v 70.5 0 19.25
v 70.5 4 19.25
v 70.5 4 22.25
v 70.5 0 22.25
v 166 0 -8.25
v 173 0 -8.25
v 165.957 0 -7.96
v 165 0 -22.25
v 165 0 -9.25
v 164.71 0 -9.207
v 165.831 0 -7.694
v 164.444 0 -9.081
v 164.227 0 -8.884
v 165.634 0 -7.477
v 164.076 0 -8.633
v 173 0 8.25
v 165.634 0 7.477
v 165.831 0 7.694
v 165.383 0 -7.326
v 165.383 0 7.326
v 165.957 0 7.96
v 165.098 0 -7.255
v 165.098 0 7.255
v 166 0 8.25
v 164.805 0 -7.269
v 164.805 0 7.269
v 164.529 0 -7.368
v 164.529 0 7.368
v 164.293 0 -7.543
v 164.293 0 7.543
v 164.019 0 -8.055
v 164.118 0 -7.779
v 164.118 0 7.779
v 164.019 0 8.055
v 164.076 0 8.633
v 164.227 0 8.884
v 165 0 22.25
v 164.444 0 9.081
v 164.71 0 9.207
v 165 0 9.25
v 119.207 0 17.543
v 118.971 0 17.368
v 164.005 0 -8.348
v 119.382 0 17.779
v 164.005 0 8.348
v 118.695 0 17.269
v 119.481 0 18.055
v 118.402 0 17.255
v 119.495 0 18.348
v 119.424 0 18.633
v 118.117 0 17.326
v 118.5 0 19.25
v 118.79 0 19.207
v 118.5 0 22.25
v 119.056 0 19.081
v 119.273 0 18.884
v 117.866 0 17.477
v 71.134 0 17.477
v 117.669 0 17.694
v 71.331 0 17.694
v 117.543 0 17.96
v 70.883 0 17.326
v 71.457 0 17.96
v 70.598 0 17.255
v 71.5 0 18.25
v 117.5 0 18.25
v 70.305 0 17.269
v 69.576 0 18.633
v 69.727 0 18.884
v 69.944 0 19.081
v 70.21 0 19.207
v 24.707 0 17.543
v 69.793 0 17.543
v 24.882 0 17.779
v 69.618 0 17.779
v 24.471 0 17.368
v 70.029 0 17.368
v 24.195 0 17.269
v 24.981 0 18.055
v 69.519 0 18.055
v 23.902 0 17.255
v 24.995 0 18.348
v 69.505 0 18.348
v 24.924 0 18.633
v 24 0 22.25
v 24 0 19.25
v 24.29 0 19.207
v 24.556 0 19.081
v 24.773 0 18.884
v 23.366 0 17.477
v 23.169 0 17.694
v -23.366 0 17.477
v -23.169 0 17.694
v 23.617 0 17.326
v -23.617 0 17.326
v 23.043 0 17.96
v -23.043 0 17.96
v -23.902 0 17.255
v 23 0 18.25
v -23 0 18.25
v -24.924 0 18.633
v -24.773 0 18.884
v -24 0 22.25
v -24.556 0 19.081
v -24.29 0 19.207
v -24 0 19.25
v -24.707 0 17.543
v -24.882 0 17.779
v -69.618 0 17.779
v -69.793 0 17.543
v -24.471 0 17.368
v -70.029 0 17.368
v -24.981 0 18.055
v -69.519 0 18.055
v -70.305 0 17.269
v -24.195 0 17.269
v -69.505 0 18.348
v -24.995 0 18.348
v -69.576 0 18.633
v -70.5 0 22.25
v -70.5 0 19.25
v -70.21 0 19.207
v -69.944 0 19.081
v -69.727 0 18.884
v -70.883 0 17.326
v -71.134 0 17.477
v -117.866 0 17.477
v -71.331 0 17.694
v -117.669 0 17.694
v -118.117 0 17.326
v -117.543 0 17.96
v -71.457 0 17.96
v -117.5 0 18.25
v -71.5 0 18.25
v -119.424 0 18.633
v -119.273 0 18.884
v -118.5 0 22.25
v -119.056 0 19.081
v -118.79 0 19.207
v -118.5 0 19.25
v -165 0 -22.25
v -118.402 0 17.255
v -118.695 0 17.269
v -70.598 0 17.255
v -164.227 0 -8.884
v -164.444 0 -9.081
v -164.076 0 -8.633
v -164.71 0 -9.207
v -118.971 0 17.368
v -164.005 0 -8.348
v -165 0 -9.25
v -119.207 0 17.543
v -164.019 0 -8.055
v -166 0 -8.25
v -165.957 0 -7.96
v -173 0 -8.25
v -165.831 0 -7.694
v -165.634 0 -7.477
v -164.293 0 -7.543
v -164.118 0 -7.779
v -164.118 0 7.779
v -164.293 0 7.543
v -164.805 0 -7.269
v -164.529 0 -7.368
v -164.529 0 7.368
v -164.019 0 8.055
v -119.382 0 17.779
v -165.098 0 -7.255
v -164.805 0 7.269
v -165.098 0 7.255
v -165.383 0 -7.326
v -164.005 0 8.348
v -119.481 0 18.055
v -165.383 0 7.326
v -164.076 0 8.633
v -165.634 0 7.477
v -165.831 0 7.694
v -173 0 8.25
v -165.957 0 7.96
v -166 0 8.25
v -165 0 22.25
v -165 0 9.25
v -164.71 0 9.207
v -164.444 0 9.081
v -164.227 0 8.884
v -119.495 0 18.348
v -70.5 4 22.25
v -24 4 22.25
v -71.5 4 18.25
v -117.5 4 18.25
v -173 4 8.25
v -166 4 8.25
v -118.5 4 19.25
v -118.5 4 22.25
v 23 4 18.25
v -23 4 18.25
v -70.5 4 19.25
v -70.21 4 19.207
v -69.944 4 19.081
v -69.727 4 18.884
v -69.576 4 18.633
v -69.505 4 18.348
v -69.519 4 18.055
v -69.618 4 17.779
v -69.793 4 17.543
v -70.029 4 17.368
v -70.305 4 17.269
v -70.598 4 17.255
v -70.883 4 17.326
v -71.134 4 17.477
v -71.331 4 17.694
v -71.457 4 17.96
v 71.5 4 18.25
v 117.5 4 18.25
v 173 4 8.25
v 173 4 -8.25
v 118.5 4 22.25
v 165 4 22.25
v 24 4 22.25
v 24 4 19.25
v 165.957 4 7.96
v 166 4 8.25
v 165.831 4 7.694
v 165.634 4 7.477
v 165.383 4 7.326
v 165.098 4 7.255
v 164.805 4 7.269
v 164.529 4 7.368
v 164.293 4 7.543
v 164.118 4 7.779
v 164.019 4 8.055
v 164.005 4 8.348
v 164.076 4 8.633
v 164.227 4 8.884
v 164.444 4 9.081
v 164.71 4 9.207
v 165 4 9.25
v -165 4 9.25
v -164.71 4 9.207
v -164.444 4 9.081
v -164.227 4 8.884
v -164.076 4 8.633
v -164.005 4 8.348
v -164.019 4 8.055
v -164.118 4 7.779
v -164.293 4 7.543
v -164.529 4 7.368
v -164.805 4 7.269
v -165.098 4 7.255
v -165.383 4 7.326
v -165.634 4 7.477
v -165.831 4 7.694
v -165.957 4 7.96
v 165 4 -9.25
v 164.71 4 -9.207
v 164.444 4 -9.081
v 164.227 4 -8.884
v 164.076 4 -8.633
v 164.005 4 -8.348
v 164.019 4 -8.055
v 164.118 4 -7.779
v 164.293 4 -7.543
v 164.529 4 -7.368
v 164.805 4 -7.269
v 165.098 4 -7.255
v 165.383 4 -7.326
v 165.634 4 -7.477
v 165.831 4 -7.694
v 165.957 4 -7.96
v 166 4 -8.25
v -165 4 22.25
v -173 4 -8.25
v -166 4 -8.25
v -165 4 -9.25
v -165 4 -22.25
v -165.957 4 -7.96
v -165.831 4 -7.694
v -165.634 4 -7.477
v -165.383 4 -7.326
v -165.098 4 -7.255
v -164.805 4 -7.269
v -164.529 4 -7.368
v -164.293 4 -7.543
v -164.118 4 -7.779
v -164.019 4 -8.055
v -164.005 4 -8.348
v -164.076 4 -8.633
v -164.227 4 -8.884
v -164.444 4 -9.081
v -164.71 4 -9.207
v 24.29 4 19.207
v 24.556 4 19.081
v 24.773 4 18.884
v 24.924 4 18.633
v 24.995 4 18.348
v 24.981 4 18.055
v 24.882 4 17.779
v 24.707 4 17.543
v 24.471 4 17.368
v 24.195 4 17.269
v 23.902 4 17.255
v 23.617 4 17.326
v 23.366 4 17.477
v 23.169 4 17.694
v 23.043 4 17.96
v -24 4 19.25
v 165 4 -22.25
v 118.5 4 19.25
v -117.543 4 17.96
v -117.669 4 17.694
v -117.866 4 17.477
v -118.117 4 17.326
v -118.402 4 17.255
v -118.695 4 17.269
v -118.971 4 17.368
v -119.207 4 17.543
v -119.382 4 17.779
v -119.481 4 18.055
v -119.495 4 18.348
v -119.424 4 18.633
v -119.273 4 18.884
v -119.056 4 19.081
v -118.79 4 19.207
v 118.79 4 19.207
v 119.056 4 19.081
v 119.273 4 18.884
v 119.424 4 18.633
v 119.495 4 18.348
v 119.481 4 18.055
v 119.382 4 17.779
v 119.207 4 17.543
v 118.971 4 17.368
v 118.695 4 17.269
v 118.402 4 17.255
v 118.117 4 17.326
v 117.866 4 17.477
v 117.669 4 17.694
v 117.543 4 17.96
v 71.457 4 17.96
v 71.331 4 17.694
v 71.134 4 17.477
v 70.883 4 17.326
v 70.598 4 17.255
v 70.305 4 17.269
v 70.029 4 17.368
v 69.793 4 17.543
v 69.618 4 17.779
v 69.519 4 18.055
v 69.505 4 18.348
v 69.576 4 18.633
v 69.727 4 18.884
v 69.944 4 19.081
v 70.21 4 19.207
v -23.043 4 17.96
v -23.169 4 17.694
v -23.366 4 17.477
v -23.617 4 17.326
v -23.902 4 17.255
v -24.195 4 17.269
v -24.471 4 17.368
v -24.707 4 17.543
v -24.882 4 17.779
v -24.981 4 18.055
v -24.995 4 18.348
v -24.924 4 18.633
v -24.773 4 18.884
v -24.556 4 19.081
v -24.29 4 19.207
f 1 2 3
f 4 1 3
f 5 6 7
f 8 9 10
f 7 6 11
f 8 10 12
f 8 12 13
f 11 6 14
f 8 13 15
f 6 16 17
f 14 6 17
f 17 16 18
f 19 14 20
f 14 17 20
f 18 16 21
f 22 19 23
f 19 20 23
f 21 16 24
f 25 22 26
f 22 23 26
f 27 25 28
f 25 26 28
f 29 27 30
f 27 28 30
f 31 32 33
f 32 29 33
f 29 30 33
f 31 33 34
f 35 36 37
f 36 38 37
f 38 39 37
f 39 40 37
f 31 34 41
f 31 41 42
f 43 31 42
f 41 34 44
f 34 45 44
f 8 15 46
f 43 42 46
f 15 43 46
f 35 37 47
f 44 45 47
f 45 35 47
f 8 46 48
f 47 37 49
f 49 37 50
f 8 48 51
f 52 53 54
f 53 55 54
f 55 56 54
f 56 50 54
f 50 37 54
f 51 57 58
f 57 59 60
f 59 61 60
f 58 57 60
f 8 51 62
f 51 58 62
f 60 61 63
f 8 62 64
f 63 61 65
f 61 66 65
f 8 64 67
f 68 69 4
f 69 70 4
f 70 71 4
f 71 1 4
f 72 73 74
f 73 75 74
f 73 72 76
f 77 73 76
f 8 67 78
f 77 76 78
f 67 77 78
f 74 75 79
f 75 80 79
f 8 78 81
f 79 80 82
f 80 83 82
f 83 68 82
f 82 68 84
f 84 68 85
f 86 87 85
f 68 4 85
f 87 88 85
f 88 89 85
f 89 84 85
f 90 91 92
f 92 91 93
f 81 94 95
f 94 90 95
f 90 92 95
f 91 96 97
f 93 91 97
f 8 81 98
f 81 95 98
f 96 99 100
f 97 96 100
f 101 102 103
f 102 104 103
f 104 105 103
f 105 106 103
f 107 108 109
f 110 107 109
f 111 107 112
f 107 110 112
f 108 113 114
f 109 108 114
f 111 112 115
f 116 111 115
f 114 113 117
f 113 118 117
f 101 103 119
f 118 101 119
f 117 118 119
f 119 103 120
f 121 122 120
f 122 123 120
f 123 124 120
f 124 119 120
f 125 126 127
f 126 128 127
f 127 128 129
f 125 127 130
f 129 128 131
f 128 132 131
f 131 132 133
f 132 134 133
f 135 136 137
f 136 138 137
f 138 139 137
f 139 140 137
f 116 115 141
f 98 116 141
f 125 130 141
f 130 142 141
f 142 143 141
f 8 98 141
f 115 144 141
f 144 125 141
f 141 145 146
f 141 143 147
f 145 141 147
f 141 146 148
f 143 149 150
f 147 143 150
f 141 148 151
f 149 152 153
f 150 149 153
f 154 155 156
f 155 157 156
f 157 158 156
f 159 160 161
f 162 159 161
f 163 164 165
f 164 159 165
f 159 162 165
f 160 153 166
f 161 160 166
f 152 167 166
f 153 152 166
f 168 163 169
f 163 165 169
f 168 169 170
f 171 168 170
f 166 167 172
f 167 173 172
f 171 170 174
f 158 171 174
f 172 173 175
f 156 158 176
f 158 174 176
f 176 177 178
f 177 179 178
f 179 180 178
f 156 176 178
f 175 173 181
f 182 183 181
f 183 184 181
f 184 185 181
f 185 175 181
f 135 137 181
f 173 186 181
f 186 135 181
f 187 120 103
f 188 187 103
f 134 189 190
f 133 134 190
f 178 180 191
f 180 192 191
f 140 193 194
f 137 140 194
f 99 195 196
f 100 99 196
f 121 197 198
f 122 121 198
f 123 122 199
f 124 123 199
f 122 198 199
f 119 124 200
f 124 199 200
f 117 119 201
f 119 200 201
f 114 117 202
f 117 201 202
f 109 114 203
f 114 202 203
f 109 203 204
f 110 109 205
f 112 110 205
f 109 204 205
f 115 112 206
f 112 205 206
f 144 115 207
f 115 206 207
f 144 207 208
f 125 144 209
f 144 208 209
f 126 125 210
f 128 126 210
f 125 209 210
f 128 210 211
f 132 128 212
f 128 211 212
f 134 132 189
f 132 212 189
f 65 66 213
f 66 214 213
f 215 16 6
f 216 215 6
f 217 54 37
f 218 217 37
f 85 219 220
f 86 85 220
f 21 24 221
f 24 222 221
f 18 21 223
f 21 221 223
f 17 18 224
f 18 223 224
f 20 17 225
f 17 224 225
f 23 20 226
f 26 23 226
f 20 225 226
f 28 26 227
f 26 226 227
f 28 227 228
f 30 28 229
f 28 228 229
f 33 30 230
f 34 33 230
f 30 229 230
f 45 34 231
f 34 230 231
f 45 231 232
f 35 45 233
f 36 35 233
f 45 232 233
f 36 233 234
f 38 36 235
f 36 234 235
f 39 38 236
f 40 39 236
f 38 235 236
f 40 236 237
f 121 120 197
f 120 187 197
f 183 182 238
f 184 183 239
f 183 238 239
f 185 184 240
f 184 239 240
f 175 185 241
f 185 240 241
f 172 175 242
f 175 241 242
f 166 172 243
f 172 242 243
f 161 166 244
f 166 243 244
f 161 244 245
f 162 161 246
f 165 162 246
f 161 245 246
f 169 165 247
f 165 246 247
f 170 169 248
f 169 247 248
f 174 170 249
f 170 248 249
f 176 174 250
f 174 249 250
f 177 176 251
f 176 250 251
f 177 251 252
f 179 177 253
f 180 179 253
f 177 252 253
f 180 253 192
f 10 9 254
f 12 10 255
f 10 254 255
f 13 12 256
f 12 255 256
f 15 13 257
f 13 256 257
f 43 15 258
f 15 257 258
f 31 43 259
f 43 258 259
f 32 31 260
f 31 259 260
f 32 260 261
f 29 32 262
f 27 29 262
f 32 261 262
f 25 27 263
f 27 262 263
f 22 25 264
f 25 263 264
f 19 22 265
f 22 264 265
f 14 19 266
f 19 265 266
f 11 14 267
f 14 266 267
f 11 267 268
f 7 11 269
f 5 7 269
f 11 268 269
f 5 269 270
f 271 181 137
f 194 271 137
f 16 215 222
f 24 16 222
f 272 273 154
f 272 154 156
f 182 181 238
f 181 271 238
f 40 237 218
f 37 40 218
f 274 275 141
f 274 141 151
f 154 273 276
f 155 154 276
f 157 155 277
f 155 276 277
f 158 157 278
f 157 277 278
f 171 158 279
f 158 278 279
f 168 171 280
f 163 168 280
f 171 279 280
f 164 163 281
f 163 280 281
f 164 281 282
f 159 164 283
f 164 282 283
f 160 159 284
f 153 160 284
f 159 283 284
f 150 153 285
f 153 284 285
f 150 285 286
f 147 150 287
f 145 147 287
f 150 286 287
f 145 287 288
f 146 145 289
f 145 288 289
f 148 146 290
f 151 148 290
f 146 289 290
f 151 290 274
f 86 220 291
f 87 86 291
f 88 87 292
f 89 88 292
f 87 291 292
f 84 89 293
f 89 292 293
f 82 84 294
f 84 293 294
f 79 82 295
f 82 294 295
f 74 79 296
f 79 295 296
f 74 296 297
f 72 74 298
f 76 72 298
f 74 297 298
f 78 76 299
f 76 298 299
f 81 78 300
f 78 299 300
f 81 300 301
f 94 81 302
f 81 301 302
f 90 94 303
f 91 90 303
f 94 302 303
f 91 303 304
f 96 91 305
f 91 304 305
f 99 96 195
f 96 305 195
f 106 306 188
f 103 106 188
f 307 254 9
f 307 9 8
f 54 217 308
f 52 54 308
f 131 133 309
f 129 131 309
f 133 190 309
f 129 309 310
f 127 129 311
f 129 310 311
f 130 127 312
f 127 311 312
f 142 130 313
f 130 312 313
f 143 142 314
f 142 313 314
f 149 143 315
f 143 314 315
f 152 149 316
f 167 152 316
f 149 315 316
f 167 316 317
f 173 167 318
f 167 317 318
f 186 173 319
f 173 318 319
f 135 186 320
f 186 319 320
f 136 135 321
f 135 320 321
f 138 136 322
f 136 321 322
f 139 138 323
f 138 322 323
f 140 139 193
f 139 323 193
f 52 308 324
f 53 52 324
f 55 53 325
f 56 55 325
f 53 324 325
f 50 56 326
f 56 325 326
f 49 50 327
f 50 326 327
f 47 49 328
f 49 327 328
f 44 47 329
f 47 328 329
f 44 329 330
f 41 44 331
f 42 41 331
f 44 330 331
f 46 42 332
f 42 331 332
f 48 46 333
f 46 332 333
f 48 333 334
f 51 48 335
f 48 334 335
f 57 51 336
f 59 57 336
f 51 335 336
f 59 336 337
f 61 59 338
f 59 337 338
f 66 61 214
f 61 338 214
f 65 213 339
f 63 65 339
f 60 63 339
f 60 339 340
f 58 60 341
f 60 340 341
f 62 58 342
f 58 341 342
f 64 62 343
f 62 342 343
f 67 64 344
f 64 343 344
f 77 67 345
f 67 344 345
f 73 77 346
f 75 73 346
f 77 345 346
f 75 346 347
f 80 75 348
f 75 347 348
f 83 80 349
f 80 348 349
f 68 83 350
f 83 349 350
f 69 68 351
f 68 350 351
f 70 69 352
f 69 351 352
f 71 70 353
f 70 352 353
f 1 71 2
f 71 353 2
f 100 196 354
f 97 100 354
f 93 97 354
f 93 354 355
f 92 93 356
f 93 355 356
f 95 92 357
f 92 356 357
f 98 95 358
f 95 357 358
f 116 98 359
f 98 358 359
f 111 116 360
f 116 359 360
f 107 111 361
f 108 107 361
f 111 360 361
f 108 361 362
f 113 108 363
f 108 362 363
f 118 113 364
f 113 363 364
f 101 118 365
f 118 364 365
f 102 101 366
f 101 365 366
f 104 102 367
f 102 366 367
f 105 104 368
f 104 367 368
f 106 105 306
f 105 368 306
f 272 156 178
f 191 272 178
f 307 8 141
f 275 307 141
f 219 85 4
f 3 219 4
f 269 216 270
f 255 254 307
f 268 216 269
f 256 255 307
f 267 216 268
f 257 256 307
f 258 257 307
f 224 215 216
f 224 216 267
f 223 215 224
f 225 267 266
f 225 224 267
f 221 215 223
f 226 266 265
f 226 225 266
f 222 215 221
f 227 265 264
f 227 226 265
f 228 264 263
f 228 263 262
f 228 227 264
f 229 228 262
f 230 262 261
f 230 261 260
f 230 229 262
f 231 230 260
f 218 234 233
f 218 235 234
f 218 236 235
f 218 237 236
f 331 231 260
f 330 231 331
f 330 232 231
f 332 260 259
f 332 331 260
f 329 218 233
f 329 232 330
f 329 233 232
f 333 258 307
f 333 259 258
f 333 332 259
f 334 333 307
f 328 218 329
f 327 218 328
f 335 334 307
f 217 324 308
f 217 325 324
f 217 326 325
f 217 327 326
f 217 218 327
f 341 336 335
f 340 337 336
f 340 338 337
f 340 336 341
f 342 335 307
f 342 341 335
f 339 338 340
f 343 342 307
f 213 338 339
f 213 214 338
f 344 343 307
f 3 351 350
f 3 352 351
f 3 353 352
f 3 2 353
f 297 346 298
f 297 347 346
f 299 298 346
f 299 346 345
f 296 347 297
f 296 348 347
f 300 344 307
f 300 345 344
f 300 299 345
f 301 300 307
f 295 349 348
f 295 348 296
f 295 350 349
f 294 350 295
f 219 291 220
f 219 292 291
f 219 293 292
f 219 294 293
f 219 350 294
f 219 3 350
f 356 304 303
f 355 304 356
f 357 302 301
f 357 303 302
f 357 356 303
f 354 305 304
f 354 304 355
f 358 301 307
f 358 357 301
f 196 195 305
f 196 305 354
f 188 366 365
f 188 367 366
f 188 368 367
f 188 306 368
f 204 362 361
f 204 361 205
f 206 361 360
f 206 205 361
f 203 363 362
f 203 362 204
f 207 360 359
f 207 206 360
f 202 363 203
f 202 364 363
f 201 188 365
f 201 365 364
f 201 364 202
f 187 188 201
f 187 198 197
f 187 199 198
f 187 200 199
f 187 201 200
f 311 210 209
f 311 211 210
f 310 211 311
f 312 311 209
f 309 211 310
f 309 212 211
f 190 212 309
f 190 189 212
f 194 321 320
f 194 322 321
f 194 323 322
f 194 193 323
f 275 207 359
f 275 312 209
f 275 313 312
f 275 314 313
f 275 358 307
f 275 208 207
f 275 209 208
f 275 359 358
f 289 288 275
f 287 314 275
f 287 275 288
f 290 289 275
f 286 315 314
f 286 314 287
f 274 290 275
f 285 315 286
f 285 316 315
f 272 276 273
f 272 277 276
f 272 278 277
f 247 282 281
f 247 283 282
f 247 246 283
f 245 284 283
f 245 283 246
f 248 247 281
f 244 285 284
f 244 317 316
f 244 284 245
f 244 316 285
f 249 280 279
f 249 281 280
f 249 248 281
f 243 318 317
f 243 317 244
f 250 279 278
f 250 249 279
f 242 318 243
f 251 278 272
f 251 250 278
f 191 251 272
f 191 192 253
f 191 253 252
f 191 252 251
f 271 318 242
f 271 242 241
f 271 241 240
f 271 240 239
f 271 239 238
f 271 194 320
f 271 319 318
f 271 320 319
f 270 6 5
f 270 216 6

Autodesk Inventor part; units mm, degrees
ref_plane "YZ Plane" through (0, 0, 0) normal (1, 0, 0) x (0, 1, 0)
ref_plane "XZ Plane" through (0, 0, 0) normal (0, 1, 0) x (-1, 0, 0)
ref_plane "XY Plane" through (0, 0, 0) normal (0, 0, 1) x (1, 0, 0)
sketch "Sketch1" plane through (0, 0, 0) normal (0, 1, 0) x (-1, 0, 0)
  line L0 (173, 22.25) -> (-173, 22.25)
  line L1 (-173, 22.25) -> (-173, -22.25)
  line L2 (-173, -22.25) -> (173, -22.25)
  line L3 (173, -22.25) -> (173, 22.25)
  point P0 (0, 0)
  point P1 (0, -22.25)
  point P2 (173, 0)
  dimension "d0" = 44.5
  dimension "d1" = 346
extrude "Extrusion1" add sketch "Sketch1" along normal blind 4
sketch "Esboço2" plane through (0, 4, 0) normal (0, 1, 0) x (1, 0, 0)
  line L0 (-173, -22.25) -> (173, -22.25) projected
  line L1 (-118.5, -22.25) -> (-70.5, -22.25)
  line L2 (-70.5, -22.25) -> (-70.5, -18.25)
  line L3 (-70.5, -18.25) -> (-118.5, -18.25)
  line L4 (-118.5, -18.25) -> (-118.5, -22.25)
  line L5 (-173, 22.25) -> (-173, -22.25) projected
  line L6 (-24, -22.25) -> (24, -22.25)
  line L7 (24, -22.25) -> (24, -18.25)
  line L8 (24, -18.25) -> (-24, -18.25)
  line L9 (-24, -18.25) -> (-24, -22.25)
  line L10 (70.5, -22.25) -> (118.5, -22.25)
  line L11 (118.5, -22.25) -> (118.5, -18.25)
  line L12 (118.5, -18.25) -> (70.5, -18.25)
  line L13 (70.5, -18.25) -> (70.5, -22.25)
  circle A0 centre (-118.5, -18.25) radius 1
  circle A1 centre (-70.5, -18.25) radius 1
  circle A2 centre (-24, -18.25) radius 1
  circle A3 centre (24, -18.25) radius 1
  circle A4 centre (70.5, -18.25) radius 1
  circle A5 centre (118.5, -18.25) radius 1
  point P0 (0, 0)
  dimension "d4" = 48
  dimension "d5" = 4
  dimension "d6" = 54.5
  dimension "d7" = 48
  dimension "d8" = 48
  dimension "d9" = 46.5
  dimension "d10" = 46.5
  dimension "d11" = 2
  dimension "d12" = 2
  dimension "d13" = 2
  dimension "d14" = 2
  dimension "d15" = 2
  dimension "d16" = 2
extrude "Extrusão2" cut sketch "Esboço2" against normal blind 10
sketch "Esboço3" plane through (0, 4, 0) normal (0, 1, 0) x (1, 0, 0)
  line L0 (-173, 22.25) -> (-173, -22.25) projected
  line L1 (-173, 22.25) -> (-165, 22.25)
  line L2 (-165, 22.25) -> (-165, 8.25)
  line L3 (-165, 8.25) -> (-173, 8.25)
  line L4 (-173, 8.25) -> (-173, 22.25)
  line L5 (-173, -22.25) -> (-165, -22.25)
  line L6 (-165, -22.25) -> (-165, -8.25)
  line L7 (-165, -8.25) -> (-173, -8.25)
  line L8 (-173, -8.25) -> (-173, -22.25)
  circle A0 centre (-165, 8.25) radius 1
  circle A1 centre (-165, -8.25) radius 1
  point P0 (0, 0)
  dimension "d19" = 8
  dimension "d20" = 14
  dimension "d21" = 14
  dimension "d22" = 16.5
  dimension "d23" = 2
  dimension "d24" = 2
extrude "Extrusão3" cut sketch "Esboço3" against normal blind 10
mirror "Espelhamento1" about plane through (0, 0, 0) normal (1, 0, 0) of "Extrusão3"
properties part number "fechamento inferior"
